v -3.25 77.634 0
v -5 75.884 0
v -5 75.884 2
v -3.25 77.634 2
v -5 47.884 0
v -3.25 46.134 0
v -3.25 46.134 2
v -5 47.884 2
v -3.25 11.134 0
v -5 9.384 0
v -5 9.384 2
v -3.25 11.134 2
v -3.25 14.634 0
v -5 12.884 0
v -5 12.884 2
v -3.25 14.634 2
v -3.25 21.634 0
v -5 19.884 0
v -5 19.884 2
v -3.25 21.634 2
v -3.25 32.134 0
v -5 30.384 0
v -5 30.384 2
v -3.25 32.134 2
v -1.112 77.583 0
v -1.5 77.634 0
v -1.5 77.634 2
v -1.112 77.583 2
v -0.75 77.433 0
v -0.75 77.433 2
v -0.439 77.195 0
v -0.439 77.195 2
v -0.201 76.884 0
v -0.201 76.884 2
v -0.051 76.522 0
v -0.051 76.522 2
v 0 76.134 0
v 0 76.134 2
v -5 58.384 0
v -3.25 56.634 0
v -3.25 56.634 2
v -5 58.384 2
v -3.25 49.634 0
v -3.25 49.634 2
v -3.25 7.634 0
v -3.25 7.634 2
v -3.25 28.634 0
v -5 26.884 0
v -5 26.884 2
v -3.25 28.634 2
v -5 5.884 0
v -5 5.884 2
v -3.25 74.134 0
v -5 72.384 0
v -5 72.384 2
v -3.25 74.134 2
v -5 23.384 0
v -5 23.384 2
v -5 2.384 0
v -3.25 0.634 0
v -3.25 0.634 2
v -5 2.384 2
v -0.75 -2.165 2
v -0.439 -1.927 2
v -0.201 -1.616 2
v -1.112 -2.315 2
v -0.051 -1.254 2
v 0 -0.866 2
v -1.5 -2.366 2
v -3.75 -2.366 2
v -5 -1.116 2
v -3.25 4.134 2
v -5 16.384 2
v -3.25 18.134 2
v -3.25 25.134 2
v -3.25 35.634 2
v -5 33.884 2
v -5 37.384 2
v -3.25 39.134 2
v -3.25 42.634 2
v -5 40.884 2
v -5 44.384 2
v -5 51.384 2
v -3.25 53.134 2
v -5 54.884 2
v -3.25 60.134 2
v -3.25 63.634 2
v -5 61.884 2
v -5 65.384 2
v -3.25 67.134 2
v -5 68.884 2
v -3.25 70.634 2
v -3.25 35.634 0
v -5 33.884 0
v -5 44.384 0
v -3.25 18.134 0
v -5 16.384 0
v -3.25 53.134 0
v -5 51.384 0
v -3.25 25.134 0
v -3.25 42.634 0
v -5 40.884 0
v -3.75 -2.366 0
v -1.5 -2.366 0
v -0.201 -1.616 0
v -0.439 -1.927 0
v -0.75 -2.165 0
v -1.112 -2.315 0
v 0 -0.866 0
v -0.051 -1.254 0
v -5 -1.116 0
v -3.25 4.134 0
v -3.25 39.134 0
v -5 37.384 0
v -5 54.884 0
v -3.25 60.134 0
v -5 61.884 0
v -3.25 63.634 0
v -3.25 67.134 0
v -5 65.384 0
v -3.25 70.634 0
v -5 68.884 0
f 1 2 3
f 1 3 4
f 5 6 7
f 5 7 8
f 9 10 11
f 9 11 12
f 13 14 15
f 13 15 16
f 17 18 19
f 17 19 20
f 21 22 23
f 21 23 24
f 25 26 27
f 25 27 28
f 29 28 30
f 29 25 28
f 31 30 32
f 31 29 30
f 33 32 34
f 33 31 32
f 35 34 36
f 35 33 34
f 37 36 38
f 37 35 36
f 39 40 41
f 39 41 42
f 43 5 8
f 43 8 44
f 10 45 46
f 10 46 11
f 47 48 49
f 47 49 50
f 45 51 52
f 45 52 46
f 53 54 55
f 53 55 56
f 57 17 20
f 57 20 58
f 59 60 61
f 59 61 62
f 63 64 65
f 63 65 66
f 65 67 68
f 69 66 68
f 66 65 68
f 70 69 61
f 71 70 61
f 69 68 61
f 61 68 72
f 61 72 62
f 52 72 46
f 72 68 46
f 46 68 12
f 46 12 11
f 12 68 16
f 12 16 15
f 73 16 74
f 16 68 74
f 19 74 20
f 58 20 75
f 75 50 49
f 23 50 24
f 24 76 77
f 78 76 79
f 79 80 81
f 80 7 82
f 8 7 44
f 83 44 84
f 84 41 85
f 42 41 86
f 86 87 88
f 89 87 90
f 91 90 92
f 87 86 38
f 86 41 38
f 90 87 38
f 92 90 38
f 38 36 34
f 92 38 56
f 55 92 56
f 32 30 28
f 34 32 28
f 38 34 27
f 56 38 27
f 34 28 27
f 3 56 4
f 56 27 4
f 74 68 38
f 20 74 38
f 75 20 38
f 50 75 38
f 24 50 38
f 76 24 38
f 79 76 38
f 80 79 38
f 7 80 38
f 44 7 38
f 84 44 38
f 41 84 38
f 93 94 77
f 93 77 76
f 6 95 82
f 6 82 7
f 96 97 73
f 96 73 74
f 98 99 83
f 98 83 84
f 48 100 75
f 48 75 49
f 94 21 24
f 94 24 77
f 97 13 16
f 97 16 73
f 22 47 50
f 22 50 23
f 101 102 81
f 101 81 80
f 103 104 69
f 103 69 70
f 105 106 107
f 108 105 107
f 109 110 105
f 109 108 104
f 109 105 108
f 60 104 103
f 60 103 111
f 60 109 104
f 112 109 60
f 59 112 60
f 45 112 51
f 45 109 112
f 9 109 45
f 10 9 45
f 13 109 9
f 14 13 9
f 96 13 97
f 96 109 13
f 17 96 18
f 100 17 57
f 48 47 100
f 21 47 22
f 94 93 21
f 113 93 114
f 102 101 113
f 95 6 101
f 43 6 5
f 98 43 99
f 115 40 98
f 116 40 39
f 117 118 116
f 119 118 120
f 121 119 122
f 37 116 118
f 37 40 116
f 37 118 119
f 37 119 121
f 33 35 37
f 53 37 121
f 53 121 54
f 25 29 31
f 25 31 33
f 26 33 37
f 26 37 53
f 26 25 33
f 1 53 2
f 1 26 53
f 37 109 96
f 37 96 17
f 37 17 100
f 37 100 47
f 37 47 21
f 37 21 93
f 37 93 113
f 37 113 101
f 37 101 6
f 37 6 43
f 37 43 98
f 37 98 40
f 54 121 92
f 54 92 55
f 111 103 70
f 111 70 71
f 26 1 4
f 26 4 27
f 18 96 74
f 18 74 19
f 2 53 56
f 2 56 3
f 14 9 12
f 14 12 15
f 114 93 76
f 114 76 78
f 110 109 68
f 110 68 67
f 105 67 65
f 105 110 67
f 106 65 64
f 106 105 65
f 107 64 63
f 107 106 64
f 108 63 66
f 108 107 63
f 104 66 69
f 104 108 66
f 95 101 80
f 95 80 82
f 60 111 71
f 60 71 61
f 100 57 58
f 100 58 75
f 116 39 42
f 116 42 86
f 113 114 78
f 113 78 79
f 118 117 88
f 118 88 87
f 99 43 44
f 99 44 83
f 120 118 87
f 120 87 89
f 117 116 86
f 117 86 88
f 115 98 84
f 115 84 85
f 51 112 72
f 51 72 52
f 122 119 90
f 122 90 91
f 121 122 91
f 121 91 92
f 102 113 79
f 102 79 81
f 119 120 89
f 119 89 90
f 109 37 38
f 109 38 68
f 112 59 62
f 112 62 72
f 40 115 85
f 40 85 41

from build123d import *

# Parameters (mm, degrees)
BOSS_EXTRUDE1_DEPTH = 2
CUT_EXTRUDE4_START  = -2
CUT_EXTRUDE4_DEPTH  = 2


# Read off the part's stored shape, not the designer's step: Cut-Extrude4
with BuildPart() as part:
    # Sketch1 → Boss-Extrude1 (new body)
    with BuildSketch(Plane.XY):
        with BuildLine():
            Line((0, 76.134146341), (0, -0.865853659))
            ThreePointArc((0, -0.865853659), (-0.439339828, -1.92651383), (-1.5, -2.365853659))
            Line((-1.5, -2.365853659), (-5, -2.365853659))
            Line((-5, -2.365853659), (-5, 77.634146341))
            Line((-5, 77.634146341), (-1.5, 77.634146341))
            ThreePointArc((-1.5, 77.634146341), (-0.439339828, 77.194806513), (0, 76.134146341))
        make_face()
    extrude(amount=BOSS_EXTRUDE1_DEPTH)

    # Cut-Extrude4 outline → Cut-Extrude4 (cut)
    with BuildSketch(Plane.XY.offset(2).offset(CUT_EXTRUDE4_START)):
        Polygon((-5, 77.634146341), (-5, 75.884146341), (-3.25, 77.634146341), align=None)
        Polygon((-3.75, -2.365853659), (-5, -1.115853659), (-5, -2.365853659), align=None)
        Polygon((-3.25, 0.634146341), (-5, 2.384146341), (-5, -1.115853659), align=None)
        Polygon((-3.25, 4.134146341), (-5, 5.884146341), (-5, 2.384146341), align=None)
        Polygon((-3.25, 7.634146341), (-5, 9.384146341), (-5, 5.884146341), align=None)
        Polygon((-3.25, 11.134146341), (-5, 12.884146341), (-5, 9.384146341), align=None)
        Polygon((-3.25, 14.634146341), (-5, 16.384146341), (-5, 12.884146341), align=None)
        Polygon((-3.25, 18.134146341), (-5, 19.884146341), (-5, 16.384146341), align=None)
        Polygon((-3.25, 21.634146341), (-5, 23.384146341), (-5, 19.884146341), align=None)
        Polygon((-3.25, 25.134146341), (-5, 26.884146341), (-5, 23.384146341), align=None)
        Polygon((-3.25, 28.634146341), (-5, 30.384146341), (-5, 26.884146341), align=None)
        Polygon((-3.25, 32.134146341), (-5, 33.884146341), (-5, 30.384146341), align=None)
        Polygon((-3.25, 35.634146341), (-5, 37.384146341), (-5, 33.884146341), align=None)
        Polygon((-3.25, 39.134146341), (-5, 40.884146341), (-5, 37.384146341), align=None)
        Polygon((-3.25, 42.634146341), (-5, 44.384146341), (-5, 40.884146341), align=None)
        Polygon((-3.25, 46.134146341), (-5, 47.884146341), (-5, 44.384146341), align=None)
        Polygon((-3.25, 49.634146341), (-5, 51.384146341), (-5, 47.884146341), align=None)
        Polygon((-3.25, 53.134146341), (-5, 54.884146341), (-5, 51.384146341), align=None)
        Polygon((-3.25, 56.634146341), (-5, 58.384146341), (-5, 54.884146341), align=None)
        Polygon((-3.25, 60.134146341), (-5, 61.884146341), (-5, 58.384146341), align=None)
        Polygon((-3.25, 63.634146341), (-5, 65.384146341), (-5, 61.884146341), align=None)
        Polygon((-3.25, 67.134146341), (-5, 68.884146341), (-5, 65.384146341), align=None)
        Polygon((-3.25, 70.634146341), (-5, 72.384146341), (-5, 68.884146341), align=None)
        Polygon((-3.25, 74.134146341), (-5, 75.884146341), (-5, 72.384146341), align=None)
    extrude(amount=CUT_EXTRUDE4_DEPTH, mode=Mode.SUBTRACT)


solid = part.part
